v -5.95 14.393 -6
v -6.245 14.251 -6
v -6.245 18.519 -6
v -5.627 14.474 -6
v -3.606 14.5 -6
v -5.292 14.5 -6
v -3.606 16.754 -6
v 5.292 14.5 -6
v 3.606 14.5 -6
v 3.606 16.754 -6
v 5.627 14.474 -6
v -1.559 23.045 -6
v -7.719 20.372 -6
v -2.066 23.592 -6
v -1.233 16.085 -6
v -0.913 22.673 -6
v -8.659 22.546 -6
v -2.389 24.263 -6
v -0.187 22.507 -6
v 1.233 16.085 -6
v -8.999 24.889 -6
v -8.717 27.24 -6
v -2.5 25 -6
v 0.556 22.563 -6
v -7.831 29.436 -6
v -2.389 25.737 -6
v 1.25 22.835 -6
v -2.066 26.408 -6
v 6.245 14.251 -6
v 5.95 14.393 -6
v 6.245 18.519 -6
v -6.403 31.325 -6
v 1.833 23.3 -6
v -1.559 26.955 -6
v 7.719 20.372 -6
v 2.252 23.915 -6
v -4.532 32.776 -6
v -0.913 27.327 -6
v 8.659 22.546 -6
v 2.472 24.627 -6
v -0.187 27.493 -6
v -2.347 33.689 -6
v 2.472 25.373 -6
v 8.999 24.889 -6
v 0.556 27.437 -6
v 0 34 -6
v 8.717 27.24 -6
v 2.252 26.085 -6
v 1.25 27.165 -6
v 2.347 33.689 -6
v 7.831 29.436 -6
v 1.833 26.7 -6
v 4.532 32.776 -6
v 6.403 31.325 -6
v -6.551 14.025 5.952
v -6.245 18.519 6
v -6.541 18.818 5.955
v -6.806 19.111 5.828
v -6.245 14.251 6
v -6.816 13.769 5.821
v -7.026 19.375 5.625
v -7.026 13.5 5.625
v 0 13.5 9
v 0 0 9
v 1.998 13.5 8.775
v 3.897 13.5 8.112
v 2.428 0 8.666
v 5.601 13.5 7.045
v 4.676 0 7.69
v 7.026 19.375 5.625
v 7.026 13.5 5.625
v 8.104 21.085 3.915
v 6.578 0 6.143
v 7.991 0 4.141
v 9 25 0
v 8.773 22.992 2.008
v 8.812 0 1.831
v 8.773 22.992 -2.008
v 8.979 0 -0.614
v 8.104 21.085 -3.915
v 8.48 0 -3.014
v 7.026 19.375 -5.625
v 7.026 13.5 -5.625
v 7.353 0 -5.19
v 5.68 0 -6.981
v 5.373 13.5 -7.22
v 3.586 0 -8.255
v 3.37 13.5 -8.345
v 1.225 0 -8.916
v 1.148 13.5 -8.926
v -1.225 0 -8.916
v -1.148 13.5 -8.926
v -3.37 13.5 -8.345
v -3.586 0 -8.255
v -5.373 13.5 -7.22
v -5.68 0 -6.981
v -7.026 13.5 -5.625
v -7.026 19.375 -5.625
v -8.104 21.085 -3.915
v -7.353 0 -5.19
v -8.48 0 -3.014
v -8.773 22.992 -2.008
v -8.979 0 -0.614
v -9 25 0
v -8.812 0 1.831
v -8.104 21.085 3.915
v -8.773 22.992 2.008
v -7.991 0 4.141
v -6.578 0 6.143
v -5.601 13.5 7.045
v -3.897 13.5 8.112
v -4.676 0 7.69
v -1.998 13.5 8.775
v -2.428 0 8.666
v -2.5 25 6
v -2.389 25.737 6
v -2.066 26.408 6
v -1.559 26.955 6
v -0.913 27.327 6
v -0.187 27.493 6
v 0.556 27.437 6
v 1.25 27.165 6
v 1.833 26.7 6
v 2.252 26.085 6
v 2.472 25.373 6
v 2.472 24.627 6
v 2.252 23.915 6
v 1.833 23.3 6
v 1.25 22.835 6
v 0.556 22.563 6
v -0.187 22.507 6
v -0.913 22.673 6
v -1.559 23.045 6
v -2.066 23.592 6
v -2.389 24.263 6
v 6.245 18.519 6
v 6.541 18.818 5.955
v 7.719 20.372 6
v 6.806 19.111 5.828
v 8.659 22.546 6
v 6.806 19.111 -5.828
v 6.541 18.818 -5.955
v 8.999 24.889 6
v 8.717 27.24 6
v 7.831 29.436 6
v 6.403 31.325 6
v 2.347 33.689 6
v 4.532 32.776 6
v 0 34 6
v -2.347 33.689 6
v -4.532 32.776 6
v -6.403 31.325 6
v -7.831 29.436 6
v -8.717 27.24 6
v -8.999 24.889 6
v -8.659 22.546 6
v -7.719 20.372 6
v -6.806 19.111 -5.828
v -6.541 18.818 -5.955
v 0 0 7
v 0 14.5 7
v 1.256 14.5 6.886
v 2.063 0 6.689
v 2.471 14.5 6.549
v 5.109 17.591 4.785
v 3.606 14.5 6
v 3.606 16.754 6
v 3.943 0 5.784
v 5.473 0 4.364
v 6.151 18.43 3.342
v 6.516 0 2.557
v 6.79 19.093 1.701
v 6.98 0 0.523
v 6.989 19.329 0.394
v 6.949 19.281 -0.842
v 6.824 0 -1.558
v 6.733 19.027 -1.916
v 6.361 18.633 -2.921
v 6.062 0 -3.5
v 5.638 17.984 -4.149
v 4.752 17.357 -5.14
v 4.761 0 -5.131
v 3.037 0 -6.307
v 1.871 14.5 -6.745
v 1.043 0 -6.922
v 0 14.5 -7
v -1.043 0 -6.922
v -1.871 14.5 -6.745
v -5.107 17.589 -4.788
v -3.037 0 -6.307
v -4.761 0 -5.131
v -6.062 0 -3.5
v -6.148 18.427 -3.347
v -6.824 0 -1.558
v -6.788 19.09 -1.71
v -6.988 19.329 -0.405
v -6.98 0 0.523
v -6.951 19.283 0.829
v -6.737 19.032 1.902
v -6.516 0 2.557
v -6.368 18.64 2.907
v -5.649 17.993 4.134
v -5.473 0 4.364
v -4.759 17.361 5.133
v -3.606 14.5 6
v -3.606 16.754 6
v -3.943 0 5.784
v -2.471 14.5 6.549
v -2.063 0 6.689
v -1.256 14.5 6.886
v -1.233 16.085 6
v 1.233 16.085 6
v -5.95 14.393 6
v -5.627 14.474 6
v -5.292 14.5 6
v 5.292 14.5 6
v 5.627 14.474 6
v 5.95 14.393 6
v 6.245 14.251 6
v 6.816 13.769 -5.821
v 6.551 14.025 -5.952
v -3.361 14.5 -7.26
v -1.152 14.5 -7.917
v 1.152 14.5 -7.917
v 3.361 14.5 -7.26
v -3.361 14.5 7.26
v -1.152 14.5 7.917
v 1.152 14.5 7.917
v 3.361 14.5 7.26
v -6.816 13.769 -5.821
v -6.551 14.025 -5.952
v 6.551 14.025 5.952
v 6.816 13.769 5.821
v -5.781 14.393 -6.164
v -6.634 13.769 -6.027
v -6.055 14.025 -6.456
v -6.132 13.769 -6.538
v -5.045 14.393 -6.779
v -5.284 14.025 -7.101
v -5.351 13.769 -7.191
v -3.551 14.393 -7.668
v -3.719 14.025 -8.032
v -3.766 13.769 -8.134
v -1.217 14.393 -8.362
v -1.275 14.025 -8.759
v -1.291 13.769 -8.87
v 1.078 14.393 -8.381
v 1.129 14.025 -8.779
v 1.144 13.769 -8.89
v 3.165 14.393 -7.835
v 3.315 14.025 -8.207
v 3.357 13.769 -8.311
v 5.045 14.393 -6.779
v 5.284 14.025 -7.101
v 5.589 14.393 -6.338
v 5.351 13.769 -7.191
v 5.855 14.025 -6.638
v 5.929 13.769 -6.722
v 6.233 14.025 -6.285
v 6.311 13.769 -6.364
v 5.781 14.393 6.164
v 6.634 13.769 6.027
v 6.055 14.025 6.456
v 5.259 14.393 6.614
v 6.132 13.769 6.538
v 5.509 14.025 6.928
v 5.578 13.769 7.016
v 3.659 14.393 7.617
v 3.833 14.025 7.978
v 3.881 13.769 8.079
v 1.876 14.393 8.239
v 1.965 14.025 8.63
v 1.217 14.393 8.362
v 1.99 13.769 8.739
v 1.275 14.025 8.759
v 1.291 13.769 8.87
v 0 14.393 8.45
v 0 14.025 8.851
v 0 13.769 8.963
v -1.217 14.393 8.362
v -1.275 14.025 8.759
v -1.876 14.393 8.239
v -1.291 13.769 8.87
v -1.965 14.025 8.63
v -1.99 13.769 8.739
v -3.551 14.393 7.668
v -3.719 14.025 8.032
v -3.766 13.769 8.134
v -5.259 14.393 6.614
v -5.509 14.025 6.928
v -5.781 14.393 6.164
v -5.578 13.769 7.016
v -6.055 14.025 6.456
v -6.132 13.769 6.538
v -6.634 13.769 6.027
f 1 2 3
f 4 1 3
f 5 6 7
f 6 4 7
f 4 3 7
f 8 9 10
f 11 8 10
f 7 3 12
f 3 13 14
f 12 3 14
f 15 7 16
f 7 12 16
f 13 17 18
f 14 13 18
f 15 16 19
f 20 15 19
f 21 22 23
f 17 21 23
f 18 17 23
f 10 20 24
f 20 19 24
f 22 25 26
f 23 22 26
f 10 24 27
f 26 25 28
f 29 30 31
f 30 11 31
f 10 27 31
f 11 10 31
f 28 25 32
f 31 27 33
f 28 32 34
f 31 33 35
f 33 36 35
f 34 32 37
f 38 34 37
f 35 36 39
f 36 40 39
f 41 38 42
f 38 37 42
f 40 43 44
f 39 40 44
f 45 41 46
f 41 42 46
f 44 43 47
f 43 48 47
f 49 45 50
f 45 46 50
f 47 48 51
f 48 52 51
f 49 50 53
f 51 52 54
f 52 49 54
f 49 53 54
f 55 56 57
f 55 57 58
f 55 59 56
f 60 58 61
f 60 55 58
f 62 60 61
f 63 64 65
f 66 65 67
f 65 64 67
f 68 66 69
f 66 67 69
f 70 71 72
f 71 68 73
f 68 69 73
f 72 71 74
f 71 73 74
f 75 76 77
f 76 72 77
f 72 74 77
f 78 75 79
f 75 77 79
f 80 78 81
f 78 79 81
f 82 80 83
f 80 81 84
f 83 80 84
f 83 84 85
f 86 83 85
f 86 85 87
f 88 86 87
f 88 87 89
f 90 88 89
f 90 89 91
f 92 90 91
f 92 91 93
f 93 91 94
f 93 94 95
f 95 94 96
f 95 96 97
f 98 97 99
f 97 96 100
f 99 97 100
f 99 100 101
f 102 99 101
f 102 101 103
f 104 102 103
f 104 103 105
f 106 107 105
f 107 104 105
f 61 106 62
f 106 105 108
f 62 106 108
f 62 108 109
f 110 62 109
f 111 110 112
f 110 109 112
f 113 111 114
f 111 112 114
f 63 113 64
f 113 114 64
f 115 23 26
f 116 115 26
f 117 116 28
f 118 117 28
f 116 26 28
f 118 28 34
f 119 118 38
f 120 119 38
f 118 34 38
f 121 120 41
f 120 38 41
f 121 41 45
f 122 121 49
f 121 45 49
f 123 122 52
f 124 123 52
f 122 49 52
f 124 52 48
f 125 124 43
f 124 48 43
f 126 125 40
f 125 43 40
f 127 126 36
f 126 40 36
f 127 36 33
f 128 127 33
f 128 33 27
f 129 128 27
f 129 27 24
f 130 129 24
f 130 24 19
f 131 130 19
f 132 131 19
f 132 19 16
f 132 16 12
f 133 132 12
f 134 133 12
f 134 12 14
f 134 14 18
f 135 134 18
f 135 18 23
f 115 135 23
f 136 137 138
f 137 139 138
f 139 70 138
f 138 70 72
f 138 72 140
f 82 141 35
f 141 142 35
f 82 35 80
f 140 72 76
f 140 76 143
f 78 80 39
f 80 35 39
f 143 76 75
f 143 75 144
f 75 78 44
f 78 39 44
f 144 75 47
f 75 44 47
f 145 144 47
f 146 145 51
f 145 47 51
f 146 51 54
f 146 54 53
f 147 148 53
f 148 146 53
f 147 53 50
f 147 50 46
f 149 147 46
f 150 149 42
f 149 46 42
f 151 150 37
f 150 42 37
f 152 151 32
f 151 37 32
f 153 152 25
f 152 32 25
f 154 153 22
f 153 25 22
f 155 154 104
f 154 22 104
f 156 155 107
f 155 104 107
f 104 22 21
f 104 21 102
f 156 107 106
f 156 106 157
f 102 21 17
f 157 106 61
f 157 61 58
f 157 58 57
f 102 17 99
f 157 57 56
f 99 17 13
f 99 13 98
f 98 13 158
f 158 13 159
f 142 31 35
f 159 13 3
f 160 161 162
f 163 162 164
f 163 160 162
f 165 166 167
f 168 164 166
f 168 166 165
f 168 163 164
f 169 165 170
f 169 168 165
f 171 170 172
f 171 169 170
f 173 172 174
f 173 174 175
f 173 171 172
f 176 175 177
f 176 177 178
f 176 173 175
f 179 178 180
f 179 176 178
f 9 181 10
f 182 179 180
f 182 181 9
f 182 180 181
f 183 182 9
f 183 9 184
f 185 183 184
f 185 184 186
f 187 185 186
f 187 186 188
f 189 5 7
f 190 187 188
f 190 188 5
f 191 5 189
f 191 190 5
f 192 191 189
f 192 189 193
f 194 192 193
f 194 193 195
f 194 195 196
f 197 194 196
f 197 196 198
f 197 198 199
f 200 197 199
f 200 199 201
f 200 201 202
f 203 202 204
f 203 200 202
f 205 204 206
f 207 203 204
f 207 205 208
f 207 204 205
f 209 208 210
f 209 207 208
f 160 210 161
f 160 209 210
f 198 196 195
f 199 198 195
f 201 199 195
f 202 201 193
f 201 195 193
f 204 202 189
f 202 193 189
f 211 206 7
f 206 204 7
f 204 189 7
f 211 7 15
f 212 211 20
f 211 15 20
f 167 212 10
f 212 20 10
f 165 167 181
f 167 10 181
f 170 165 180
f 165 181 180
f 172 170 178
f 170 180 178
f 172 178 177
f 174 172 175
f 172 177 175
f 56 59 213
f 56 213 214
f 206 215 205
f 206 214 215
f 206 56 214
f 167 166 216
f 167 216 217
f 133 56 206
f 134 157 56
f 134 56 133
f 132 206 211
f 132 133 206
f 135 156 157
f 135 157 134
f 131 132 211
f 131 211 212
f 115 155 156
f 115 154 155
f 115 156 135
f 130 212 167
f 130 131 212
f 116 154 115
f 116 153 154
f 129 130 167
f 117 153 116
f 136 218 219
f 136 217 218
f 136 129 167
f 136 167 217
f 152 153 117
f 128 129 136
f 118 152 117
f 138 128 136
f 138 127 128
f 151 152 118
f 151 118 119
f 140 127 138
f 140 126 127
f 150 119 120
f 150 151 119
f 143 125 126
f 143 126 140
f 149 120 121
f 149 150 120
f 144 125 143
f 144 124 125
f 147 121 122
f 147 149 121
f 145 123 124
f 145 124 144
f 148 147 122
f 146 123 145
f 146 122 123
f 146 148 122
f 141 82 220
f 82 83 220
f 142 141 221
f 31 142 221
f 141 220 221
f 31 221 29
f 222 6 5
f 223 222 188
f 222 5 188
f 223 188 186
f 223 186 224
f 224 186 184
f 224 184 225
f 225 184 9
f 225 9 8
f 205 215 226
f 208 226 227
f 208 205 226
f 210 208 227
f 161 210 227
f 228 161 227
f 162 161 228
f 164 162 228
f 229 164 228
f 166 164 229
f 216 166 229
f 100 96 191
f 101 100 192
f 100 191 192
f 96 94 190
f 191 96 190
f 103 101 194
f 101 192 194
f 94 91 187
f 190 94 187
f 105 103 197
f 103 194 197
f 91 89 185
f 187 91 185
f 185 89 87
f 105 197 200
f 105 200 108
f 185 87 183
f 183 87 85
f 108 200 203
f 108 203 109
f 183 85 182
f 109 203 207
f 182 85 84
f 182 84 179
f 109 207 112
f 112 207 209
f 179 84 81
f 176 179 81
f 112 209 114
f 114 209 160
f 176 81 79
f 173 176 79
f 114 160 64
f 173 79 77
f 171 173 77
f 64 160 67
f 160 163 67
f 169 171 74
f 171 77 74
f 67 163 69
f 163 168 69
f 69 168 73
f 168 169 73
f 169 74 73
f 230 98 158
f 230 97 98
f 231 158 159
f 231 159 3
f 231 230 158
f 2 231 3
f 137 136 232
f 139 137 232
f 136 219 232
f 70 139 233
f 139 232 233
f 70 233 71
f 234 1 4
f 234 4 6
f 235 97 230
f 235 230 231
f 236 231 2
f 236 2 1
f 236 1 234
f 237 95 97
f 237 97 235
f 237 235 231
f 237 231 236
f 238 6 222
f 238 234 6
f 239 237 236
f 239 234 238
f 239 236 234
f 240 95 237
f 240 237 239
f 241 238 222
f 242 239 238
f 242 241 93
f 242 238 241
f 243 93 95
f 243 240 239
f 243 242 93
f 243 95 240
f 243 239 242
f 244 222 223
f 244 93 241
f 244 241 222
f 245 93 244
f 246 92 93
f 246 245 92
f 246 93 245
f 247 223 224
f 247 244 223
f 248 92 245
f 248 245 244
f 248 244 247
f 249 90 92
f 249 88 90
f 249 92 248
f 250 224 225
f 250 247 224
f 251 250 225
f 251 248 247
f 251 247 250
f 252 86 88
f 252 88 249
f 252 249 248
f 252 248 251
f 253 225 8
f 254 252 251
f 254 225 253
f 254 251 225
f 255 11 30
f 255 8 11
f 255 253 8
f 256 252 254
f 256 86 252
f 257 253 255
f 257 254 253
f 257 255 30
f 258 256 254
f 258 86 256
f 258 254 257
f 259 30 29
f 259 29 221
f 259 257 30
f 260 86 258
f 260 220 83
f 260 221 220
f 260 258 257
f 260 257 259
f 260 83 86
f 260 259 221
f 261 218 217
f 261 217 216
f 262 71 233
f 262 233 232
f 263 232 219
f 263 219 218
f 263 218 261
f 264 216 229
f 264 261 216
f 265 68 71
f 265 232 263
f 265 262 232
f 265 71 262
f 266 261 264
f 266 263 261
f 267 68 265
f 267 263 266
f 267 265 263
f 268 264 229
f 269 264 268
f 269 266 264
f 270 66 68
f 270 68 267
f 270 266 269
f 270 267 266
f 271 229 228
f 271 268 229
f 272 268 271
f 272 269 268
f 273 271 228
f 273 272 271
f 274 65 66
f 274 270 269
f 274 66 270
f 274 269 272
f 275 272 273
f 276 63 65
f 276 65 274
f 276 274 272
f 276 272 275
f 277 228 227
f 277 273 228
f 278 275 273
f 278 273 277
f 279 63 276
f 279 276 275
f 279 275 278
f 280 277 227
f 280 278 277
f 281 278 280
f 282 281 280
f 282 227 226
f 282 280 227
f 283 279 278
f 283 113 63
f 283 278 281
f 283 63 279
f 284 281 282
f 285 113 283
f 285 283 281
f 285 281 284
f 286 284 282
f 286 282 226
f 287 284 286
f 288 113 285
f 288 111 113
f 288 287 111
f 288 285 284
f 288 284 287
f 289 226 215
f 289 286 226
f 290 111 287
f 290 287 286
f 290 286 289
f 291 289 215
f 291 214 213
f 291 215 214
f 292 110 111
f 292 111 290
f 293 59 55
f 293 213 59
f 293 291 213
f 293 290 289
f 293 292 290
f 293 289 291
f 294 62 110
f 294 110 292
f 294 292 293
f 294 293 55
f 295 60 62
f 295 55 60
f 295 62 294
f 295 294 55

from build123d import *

# Parameters (mm, degrees)
SKETCH1_R                = 9
SKETCH1_R_2              = 7
BOSS_EXTRUDE1_DEPTH      = 25
CUT_EXTRUDE2_DEPTH       = 12
CUT_EXTRUDE2_DEPTH_BACK  = 27
SKETCH2_R                = 9
BOSS_EXTRUDE8_DEPTH      = 9
BOSS_EXTRUDE8_DEPTH_BACK = 9
SKETCH4_R                = 9
SKETCH5_R                = 8
CUT_EXTRUDE3_DEPTH       = 3
CUT_EXTRUDE4_START       = -3
SKETCH6_R                = 8
CUT_EXTRUDE4_DEPTH       = 3
SKETCH7_R                = 2.5
CUT_EXTRUDE5_DEPTH       = 17
CUT_EXTRUDE6_DEPTH       = 15
FILLET2_R                = 1


with BuildPart() as part:
    # Sketch1 → Boss-Extrude1 (new body)
    with BuildSketch(Plane(origin=(0, 0, 0), x_dir=(1, 0, 0), z_dir=(0, 1, 0))):
        Circle(SKETCH1_R)
        Circle(SKETCH1_R_2, mode=Mode.SUBTRACT)
    extrude(amount=BOSS_EXTRUDE1_DEPTH)

    # Sketch2 → Cut-Extrude2 (cut, two sides: drawn at the far end of the back side and taken through both)
    with BuildSketch(Plane.XY.offset(9).offset(-CUT_EXTRUDE2_DEPTH_BACK)):
        with Locations((0, 25)):
            Circle(SKETCH2_R)
    extrude(amount=CUT_EXTRUDE2_DEPTH + CUT_EXTRUDE2_DEPTH_BACK, mode=Mode.SUBTRACT)

    # Sketch4 → Boss-Extrude8 (add, two sides: drawn at the far end of the back side and taken through both)
    with BuildSketch(Plane.XY.offset(-BOSS_EXTRUDE8_DEPTH_BACK)):
        with Locations((0, 25)):
            Circle(SKETCH4_R)
    extrude(amount=BOSS_EXTRUDE8_DEPTH + BOSS_EXTRUDE8_DEPTH_BACK)

    # Sketch5 → Cut-Extrude3 (cut)
    with BuildSketch(Plane.XY.offset(9)):
        with Locations((0, 25)):
            Circle(SKETCH5_R)
    extrude(amount=-CUT_EXTRUDE3_DEPTH, mode=Mode.SUBTRACT)

    # Sketch6 → Cut-Extrude4 (cut)
    with BuildSketch(Plane(origin=(0, 0, -9), x_dir=(-1, 0, 0), z_dir=(0, 0, -1)).offset(CUT_EXTRUDE4_START)):
        with Locations((0, 25)):
            Circle(SKETCH6_R)
    extrude(amount=CUT_EXTRUDE4_DEPTH, mode=Mode.SUBTRACT)

    # Sketch7 → Cut-Extrude5 (cut)
    with BuildSketch(Plane(origin=(0, 0, -6), x_dir=(-1, 0, 0), z_dir=(0, 0, -1))):
        with Locations((0, 25)):
            Circle(SKETCH7_R)
    extrude(amount=-CUT_EXTRUDE5_DEPTH, mode=Mode.SUBTRACT)

    # Sketch8 → Cut-Extrude6 (cut)
    with BuildSketch(Plane.XY.offset(6)):
        with BuildLine():
            Line((-10.5, 25), (-10.5, 14.5))
            Line((-10.5, 14.5), (10.5, 14.5))
            Line((10.5, 14.5), (10.5, 25))
            ThreePointArc((10.5, 25), (0, 35.5), (-10.5, 25))
        make_face()
    cut_extrude6 = extrude(amount=CUT_EXTRUDE6_DEPTH, mode=Mode.SUBTRACT)

    # Mirror1: Cut-Extrude6 across plane
    add(cut_extrude6.mirror(Plane.XY), mode=Mode.SUBTRACT)

    # Fillet2
    fillet2_edges = [part.edges().sort_by_distance(p)[0] for p in [
        (0, 14.5, -9),
        (6.708203932, 16.75, -6),
        (6.708203932, 16.75, 6),
        (-6.708203932, 16.75, 6),
        (-6.708203932, 16.75, -6),
        (0, 14.5, 9),
    ]]
    fillet(fillet2_edges, radius=FILLET2_R)


solid = part.part
